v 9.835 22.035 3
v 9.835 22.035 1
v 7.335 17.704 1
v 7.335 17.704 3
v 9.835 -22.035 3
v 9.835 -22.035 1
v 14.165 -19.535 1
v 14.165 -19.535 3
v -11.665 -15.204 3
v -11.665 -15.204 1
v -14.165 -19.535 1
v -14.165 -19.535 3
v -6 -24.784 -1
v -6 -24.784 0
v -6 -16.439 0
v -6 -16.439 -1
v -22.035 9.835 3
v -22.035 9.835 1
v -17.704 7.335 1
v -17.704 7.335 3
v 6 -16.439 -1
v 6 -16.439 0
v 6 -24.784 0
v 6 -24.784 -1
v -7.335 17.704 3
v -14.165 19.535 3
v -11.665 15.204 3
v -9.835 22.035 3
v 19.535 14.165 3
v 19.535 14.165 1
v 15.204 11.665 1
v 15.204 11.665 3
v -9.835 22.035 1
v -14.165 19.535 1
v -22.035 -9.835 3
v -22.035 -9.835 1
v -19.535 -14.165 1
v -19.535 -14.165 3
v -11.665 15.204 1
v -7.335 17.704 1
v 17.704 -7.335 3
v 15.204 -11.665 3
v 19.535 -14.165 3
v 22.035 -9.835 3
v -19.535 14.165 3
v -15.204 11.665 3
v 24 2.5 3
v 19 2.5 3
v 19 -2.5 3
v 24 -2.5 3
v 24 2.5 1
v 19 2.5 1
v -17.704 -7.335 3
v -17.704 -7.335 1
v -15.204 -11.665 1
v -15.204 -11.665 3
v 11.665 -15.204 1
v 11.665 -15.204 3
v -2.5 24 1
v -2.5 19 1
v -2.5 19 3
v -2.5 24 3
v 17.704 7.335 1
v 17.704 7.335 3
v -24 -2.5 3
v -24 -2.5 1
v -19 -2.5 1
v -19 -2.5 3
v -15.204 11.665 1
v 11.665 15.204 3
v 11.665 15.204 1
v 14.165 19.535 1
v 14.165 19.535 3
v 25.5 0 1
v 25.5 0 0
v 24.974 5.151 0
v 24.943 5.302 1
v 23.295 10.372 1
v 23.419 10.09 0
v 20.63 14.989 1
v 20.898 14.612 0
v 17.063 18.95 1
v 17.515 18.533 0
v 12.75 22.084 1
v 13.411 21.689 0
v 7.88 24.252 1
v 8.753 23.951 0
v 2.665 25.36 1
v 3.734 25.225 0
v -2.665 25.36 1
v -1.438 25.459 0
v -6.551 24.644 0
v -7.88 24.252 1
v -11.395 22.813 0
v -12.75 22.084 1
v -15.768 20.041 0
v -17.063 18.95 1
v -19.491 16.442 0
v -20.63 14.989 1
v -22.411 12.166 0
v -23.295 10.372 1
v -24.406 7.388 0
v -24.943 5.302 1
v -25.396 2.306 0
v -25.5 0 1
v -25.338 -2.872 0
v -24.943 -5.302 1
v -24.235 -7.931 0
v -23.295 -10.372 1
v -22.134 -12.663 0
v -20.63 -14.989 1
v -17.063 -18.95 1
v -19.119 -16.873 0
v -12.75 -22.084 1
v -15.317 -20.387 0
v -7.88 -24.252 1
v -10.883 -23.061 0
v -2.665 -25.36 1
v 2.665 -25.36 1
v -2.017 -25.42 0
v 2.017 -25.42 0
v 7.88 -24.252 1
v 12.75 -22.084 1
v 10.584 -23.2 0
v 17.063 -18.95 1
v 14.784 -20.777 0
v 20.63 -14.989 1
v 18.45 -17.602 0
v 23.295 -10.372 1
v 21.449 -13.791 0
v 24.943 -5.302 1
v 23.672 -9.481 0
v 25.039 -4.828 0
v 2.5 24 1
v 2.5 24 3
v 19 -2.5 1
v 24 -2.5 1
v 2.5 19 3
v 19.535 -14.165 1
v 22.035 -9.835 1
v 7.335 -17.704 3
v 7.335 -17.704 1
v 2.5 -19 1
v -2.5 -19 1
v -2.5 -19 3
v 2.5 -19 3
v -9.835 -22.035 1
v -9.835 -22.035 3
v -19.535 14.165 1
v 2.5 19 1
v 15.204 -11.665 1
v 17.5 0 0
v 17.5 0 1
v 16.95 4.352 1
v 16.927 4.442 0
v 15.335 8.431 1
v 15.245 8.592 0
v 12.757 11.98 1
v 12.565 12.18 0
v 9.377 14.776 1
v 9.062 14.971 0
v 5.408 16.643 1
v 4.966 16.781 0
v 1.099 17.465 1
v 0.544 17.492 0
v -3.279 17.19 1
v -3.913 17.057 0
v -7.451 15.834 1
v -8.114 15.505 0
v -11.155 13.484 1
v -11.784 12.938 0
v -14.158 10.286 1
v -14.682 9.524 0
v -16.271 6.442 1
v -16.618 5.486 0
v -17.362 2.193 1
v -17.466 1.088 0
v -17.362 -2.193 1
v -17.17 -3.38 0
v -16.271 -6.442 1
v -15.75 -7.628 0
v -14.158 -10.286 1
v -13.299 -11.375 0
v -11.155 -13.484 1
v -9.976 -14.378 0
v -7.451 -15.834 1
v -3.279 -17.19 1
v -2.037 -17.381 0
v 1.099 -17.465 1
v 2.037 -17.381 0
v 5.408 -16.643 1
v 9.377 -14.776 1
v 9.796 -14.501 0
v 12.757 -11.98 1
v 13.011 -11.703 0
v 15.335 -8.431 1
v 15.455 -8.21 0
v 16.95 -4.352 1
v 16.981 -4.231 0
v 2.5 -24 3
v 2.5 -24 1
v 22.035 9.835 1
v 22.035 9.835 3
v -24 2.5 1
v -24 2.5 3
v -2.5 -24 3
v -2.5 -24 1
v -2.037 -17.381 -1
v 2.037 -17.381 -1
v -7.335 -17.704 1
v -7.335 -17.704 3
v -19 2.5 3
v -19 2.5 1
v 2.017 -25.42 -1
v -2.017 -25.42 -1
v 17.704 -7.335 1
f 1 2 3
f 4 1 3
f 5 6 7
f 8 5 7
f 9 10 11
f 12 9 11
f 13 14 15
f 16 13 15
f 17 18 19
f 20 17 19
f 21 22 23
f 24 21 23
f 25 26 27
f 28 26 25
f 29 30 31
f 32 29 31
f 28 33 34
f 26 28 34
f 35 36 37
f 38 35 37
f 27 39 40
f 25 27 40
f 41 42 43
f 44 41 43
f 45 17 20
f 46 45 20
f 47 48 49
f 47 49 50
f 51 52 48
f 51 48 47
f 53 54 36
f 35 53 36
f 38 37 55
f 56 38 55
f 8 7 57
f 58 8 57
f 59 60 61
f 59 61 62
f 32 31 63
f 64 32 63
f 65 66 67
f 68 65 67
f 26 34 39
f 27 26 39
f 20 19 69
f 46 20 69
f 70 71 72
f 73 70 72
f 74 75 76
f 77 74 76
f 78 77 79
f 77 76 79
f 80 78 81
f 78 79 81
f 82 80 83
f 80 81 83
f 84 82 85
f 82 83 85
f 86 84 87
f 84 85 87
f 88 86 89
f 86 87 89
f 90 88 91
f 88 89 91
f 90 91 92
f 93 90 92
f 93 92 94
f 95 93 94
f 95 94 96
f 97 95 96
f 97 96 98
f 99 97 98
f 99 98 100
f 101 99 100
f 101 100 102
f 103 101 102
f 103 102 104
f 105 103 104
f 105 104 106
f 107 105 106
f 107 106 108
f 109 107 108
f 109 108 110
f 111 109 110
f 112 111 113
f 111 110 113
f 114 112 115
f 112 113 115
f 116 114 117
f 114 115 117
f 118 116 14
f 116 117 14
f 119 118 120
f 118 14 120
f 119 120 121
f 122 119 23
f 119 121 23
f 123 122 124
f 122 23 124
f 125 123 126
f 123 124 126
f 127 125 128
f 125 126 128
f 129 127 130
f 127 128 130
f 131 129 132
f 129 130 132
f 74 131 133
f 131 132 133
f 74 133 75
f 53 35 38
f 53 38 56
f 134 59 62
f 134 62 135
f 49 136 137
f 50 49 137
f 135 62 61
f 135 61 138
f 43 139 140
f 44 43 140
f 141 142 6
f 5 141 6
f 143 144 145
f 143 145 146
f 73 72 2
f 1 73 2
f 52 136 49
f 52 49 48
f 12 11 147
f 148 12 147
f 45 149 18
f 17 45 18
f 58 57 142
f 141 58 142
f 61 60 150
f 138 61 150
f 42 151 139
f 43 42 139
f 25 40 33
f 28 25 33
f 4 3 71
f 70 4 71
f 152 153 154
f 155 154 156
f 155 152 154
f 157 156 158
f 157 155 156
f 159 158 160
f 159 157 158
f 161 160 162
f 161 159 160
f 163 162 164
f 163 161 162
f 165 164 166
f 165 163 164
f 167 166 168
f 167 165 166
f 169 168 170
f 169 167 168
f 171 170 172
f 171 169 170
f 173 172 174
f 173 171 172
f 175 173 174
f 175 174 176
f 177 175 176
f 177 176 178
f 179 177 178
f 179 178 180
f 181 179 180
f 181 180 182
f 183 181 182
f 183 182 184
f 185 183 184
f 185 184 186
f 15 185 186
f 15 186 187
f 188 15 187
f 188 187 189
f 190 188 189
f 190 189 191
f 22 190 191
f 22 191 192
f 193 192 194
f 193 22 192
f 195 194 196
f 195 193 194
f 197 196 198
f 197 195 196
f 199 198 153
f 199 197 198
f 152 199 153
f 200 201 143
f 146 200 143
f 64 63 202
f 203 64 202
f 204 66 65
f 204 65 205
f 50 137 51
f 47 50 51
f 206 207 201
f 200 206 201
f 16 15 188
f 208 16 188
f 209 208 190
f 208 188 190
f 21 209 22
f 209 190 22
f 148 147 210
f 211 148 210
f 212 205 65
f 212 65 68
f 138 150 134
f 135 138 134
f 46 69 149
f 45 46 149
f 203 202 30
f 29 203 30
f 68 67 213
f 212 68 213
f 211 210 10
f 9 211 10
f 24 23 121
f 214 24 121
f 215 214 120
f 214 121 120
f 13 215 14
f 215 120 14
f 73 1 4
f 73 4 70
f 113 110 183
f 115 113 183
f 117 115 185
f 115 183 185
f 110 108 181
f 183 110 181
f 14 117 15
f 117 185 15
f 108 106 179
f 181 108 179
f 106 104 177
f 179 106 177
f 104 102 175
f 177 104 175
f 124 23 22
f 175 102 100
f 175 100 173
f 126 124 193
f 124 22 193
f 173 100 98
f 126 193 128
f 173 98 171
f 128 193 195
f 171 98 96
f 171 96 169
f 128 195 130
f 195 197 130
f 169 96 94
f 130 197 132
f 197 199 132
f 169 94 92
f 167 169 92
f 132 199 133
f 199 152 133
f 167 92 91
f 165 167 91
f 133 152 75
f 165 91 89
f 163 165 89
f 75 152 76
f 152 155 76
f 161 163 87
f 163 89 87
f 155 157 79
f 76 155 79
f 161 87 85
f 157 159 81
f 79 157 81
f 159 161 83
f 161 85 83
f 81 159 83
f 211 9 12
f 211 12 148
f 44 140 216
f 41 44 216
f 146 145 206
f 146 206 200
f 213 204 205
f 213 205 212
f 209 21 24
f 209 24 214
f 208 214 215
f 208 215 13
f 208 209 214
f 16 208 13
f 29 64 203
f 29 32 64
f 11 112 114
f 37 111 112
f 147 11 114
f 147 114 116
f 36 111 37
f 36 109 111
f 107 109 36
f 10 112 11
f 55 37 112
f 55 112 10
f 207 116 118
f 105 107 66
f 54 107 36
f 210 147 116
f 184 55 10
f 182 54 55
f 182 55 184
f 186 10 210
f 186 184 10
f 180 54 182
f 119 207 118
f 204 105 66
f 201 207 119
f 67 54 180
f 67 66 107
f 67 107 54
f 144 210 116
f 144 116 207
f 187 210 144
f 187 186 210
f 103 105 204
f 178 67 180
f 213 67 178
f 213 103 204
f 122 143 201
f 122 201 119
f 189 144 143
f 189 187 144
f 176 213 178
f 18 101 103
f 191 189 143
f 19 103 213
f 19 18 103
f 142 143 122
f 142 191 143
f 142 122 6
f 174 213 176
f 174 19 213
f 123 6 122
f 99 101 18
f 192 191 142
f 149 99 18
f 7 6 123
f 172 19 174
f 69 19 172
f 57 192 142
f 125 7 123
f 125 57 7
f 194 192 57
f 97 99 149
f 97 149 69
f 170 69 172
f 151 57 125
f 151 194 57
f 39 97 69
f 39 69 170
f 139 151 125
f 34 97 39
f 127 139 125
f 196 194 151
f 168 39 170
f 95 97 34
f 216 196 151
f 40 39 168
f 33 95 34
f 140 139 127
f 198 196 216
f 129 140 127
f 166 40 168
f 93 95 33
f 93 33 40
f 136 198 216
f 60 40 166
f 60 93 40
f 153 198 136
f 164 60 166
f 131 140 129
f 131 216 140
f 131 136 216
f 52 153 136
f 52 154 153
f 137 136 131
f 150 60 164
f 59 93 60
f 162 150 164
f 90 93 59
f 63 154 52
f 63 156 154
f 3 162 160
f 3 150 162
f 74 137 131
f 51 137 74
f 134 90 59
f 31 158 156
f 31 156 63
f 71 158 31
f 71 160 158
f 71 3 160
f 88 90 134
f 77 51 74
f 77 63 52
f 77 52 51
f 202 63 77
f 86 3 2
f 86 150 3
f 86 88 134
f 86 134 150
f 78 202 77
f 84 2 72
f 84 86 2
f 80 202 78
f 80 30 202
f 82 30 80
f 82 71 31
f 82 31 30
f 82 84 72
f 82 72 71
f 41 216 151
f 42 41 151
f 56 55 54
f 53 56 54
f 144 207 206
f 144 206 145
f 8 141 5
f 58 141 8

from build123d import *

# Parameters (mm, degrees)
SKIZZE1_R                       = 25.5
SKIZZE1_R_2                     = 17.5
AUFSATZ_LINEAR_AUSTRAGEN1_DEPTH = 1
AUFSATZ_LINEAR_AUSTRAGEN2_DEPTH = 1
SKIZZE3_W                       = 5
SKIZZE3_H                       = 5
AUFSATZ_LINEAR_AUSTRAGEN3_DEPTH = 2


with BuildPart() as part:
    # Skizze1 → Aufsatz-Linear austragen1 (new body)
    with BuildSketch(Plane.XY):
        Circle(SKIZZE1_R)
        Circle(SKIZZE1_R_2, mode=Mode.SUBTRACT)
    extrude(amount=AUFSATZ_LINEAR_AUSTRAGEN1_DEPTH)

    # Skizze2 → Aufsatz-Linear austragen2 (add)
    with BuildSketch(Plane(origin=(0, 0, 0), x_dir=(-1, 0, 0), z_dir=(0, 0, -1))):
        with BuildLine():
            Line((-6, -16.439282223), (-6, -24.784067463))
            ThreePointArc((-6, -24.784067463), (0, -25.5), (6, -24.784067463))
            Line((6, -24.784067463), (6, -16.439282223))
            ThreePointArc((6, -16.439282223), (0, -17.5), (-6, -16.439282223))
        make_face()
    extrude(amount=AUFSATZ_LINEAR_AUSTRAGEN2_DEPTH)

    # Skizze3 → Aufsatz-Linear austragen3 (add)
    with BuildSketch(Plane.XY.offset(1)):
        Polygon((-11.665063509, -15.204482672), (-14.165063509, -19.534609691), (-9.834936491, -22.034609691), (-7.334936491, -17.704482672), align=None)
        with Locations((0, -21.5)):
            Rectangle(SKIZZE3_W, SKIZZE3_H)
        Polygon((-17.704482672, -7.334936491), (-22.034609691, -9.834936491), (-19.534609691, -14.165063509), (-15.204482672, -11.665063509), align=None)
        with Locations((-21.5, 0)):
            Rectangle(SKIZZE3_W, SKIZZE3_H)
        Polygon((-15.204482672, 11.665063509), (-19.534609691, 14.165063509), (-22.034609691, 9.834936491), (-17.704482672, 7.334936491), align=None)
        Polygon((-7.334936491, 17.704482672), (-9.834936491, 22.034609691), (-14.165063509, 19.534609691), (-11.665063509, 15.204482672), align=None)
        with Locations((0, 21.5)):
            Rectangle(SKIZZE3_W, SKIZZE3_H)
        Polygon((11.665063509, 15.204482672), (14.165063509, 19.534609691), (9.834936491, 22.034609691), (7.334936491, 17.704482672), align=None)
        Polygon((17.704482672, 7.334936491), (22.034609691, 9.834936491), (19.534609691, 14.165063509), (15.204482672, 11.665063509), align=None)
        with Locations((21.5, 0)):
            Rectangle(SKIZZE3_W, SKIZZE3_H)
        Polygon((15.204482672, -11.665063509), (19.534609691, -14.165063509), (22.034609691, -9.834936491), (17.704482672, -7.334936491), align=None)
        Polygon((7.334936491, -17.704482672), (9.834936491, -22.034609691), (14.165063509, -19.534609691), (11.665063509, -15.204482672), align=None)
    extrude(amount=AUFSATZ_LINEAR_AUSTRAGEN3_DEPTH)


solid = part.part
